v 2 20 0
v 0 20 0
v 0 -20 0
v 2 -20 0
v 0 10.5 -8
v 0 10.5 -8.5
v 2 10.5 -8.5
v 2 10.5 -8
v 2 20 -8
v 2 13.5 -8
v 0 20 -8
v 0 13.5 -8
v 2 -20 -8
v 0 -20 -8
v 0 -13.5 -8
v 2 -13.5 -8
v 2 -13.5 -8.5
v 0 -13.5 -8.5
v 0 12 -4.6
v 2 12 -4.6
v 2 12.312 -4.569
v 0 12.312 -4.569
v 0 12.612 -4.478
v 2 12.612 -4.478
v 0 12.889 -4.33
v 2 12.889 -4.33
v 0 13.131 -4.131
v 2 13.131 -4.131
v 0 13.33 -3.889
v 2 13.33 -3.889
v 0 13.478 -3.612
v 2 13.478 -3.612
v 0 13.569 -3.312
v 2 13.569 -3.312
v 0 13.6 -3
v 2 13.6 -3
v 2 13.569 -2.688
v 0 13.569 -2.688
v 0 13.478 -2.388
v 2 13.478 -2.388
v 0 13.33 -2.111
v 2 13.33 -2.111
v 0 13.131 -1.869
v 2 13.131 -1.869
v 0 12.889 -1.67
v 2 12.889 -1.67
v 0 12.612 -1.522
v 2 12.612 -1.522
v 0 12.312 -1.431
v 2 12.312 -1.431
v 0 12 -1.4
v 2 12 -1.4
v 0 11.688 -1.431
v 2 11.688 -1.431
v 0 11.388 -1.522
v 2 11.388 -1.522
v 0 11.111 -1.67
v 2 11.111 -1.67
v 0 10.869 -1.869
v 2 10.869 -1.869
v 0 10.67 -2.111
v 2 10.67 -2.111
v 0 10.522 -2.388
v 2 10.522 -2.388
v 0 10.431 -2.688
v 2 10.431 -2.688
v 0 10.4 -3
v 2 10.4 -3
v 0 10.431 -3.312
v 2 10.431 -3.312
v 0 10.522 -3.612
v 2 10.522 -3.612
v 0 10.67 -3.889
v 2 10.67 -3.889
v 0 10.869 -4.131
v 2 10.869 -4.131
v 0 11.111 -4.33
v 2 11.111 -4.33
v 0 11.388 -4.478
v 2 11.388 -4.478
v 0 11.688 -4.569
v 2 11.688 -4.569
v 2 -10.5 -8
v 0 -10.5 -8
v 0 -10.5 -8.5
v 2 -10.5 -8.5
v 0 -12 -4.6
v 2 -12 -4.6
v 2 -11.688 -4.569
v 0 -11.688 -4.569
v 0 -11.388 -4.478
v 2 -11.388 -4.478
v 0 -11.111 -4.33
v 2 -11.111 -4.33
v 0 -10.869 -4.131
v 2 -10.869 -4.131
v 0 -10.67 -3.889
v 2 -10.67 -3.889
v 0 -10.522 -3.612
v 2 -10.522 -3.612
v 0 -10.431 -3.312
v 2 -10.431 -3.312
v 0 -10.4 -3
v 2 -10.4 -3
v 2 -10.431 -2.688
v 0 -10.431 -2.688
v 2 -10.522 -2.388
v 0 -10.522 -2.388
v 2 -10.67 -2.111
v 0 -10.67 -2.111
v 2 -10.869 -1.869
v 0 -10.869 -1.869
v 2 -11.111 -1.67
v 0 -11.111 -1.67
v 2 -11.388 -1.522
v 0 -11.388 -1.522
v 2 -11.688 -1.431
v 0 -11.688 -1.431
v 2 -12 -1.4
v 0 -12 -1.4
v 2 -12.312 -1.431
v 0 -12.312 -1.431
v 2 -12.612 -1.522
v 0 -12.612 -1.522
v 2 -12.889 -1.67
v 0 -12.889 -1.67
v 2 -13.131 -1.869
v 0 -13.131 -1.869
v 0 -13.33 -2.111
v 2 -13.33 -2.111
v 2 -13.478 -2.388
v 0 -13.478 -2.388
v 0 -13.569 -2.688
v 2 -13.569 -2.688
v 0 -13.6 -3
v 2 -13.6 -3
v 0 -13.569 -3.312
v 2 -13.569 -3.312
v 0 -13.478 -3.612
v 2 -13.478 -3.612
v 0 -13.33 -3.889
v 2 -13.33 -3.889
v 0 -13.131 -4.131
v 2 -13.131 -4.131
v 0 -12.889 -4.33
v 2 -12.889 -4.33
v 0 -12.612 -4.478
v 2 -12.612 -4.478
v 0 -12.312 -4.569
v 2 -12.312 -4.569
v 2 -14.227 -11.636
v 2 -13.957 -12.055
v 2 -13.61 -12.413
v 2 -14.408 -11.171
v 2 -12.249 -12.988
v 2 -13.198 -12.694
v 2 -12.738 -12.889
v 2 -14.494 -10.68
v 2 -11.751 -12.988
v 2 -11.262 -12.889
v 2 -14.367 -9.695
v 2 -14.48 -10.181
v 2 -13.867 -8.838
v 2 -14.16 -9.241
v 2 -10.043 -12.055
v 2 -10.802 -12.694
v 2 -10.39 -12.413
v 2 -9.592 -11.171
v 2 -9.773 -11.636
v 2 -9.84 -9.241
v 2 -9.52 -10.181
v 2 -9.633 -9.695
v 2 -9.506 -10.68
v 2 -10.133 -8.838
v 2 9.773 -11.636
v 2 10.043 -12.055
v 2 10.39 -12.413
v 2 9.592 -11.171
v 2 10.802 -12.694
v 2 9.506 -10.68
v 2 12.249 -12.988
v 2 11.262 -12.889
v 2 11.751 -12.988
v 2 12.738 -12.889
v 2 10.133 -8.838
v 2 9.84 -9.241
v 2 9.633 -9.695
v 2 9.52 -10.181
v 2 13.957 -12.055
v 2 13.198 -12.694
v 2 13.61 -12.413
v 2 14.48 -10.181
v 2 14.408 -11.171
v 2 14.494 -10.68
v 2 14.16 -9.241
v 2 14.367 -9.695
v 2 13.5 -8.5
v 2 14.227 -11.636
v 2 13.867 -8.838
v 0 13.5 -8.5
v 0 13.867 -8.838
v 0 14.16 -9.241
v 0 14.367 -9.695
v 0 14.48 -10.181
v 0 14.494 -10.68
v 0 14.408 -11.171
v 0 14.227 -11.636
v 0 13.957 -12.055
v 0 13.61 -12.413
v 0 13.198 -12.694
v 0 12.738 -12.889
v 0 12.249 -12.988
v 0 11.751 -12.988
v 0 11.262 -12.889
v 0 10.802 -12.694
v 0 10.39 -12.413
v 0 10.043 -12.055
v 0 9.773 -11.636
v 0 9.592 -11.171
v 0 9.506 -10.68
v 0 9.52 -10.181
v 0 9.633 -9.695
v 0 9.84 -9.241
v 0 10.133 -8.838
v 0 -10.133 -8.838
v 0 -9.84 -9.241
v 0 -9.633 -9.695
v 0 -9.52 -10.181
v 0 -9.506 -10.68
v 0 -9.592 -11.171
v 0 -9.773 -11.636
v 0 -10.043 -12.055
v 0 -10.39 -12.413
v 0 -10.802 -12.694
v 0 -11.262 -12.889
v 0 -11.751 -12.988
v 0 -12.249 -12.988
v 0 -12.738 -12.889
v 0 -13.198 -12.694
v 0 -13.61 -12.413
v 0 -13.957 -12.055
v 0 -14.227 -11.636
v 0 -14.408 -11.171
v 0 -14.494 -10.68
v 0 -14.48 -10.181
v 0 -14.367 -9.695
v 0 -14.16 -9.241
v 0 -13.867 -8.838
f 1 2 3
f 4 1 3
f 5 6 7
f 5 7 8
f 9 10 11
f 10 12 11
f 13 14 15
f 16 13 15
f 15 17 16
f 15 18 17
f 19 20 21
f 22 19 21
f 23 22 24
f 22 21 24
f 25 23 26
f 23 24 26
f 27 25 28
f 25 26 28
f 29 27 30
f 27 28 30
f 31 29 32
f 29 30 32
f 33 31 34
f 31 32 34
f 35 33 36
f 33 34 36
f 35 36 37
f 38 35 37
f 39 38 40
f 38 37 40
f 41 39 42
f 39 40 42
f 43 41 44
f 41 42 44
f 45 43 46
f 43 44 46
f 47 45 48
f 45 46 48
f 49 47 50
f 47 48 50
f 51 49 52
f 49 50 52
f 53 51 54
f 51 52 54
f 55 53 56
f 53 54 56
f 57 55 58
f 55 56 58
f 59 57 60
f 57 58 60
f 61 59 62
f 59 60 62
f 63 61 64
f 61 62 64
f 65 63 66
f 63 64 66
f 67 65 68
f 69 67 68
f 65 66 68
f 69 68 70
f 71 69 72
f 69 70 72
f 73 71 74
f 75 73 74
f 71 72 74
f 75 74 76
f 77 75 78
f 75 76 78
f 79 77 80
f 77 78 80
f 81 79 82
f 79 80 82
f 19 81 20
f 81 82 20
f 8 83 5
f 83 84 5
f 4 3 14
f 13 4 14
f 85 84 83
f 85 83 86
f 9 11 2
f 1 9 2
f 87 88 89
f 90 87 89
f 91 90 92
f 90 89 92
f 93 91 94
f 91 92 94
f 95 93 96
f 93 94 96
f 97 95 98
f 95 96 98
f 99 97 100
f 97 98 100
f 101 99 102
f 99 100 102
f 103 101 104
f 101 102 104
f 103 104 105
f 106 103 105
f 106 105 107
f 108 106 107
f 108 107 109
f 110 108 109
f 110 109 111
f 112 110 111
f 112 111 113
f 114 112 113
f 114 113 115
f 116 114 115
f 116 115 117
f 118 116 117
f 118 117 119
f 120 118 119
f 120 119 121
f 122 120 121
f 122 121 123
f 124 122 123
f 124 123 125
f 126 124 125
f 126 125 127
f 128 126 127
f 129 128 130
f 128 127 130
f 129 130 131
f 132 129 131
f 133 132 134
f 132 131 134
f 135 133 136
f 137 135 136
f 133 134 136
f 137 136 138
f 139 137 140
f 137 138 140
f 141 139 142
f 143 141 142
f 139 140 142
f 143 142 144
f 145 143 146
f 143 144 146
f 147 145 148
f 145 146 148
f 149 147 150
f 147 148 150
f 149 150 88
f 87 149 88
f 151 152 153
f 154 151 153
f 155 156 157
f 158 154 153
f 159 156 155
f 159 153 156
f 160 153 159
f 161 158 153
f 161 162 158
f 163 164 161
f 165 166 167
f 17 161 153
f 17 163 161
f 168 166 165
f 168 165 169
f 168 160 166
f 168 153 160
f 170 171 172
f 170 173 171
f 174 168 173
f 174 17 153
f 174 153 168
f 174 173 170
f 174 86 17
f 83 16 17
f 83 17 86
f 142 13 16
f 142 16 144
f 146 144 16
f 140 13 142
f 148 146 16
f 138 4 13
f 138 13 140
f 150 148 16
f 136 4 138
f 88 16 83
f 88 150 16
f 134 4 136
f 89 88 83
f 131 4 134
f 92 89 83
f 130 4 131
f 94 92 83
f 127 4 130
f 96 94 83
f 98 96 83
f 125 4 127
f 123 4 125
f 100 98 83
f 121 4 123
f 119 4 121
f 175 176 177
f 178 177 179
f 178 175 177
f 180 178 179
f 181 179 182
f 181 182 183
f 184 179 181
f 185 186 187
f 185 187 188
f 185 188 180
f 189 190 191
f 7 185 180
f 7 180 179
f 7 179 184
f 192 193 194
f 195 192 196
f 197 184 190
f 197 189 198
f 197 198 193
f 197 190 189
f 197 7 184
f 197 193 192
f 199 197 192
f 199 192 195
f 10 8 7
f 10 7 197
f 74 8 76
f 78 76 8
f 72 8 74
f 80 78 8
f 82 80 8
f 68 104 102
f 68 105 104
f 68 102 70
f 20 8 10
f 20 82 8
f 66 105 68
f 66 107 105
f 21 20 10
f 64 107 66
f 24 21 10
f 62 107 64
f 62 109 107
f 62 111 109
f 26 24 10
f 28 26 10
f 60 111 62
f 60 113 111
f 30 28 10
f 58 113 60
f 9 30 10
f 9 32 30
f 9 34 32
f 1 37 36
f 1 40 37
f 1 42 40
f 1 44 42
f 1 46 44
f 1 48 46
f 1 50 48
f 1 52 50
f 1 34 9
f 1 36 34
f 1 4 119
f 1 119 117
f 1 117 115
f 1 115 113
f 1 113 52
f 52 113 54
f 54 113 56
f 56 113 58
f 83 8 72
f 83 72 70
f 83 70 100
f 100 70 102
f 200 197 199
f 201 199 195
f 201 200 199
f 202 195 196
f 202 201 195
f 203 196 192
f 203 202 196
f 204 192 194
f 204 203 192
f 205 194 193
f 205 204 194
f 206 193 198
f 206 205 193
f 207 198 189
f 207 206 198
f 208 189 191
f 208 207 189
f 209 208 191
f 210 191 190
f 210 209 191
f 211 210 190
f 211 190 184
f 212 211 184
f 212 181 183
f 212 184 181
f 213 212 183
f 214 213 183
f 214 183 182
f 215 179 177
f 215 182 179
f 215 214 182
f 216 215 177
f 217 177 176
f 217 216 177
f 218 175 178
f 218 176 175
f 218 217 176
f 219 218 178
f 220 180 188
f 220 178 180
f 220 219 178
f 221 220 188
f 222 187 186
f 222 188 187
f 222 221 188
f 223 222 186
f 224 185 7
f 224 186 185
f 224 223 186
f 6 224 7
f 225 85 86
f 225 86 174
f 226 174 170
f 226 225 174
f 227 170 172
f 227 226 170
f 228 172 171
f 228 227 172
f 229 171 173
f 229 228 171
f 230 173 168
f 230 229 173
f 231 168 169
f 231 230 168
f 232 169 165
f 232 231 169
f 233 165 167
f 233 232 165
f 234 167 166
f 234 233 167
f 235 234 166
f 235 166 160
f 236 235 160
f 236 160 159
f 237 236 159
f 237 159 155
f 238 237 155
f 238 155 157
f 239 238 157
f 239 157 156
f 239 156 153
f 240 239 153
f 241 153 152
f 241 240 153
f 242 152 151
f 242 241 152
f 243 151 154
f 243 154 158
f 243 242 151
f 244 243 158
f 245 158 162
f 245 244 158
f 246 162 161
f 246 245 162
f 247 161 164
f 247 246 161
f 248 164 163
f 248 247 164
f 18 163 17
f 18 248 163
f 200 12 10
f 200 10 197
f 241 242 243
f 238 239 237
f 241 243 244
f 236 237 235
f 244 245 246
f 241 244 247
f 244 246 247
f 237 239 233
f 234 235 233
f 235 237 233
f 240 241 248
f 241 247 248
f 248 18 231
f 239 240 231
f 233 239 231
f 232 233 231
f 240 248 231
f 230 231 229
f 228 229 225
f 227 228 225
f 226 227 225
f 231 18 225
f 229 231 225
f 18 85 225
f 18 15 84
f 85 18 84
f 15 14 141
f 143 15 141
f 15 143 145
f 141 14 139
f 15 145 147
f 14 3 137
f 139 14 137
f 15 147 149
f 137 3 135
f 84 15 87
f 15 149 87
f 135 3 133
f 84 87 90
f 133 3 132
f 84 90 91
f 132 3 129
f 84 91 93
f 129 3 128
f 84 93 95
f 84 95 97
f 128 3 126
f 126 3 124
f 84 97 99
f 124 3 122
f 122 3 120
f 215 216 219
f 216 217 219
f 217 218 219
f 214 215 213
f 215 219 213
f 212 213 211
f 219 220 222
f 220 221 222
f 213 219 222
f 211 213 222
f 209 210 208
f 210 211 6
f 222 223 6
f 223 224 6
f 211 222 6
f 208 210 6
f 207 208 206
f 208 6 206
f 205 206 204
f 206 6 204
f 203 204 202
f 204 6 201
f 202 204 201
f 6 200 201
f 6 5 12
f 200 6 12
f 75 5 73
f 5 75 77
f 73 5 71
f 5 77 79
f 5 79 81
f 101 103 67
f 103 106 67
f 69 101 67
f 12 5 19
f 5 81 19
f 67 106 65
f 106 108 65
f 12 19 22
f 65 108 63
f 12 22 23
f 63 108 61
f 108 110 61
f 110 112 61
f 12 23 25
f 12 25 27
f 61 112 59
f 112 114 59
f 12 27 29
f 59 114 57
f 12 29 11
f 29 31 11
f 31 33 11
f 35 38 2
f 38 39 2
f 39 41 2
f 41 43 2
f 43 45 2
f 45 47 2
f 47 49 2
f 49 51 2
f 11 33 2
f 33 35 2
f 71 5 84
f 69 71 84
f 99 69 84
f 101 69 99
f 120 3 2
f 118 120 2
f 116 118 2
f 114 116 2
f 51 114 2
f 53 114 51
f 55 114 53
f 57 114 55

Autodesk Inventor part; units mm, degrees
ref_plane "YZ Plane" through (0, 0, 0) normal (1, 0, 0) x (0, 1, 0)
ref_plane "XZ Plane" through (0, 0, 0) normal (0, 1, 0) x (-1, 0, 0)
ref_plane "XY Plane" through (0, 0, 0) normal (0, 0, 1) x (1, 0, 0)
sketch "スケッチ1" plane through (0, 0, 0) normal (1, 0, 0) x (0, 1, 0)
  line L0 (20, 0) -> (0, 0)
  line L1 (0, 0) -> (0, -8)
  line L2 (0, -8) -> (20, -8)
  line L3 (20, -8) -> (20, 0)
  circle A0 centre (12, -10.5) radius 2.5 construction
  circle A1 centre (12, -10.5) radius 2.5
  line L4 (13.5, -8.5) -> (10.5, -8.5)
  line L5 (10.5, -8.5) -> (10.5, -8)
  line L6 (10.5, -8) -> (13.5, -8)
  line L7 (13.5, -8) -> (13.5, -8.5)
  line L8 (12, -10.5) -> (12, -8)
  point P0 (13.5, -8)
  point P1 (10.5, -8)
  dimension "d1" = 5
  dimension "d0" = 5
  dimension "d2" = 3
  dimension "d3" = 12
  dimension "d4" = 8
  dimension "d5" = 20
extrude "押し出し1" add sketch "スケッチ1" along normal blind 2
mirror "ミラー1" about plane through (0, 0, 0) normal (0, -1, 0)
sketch "スケッチ2" plane through (2, 0, 0) normal (1, 0, 0) x (0, 0, -1)
  line L0 (8.5, 13.5) -> (8, 13.5) projected
  line L1 (8, 13.5) -> (8, 20) projected
  line L2 (8, 20) -> (0, 20) projected
  line L3 (0, 20) -> (0, -20) projected
  line L4 (8, -20) -> (0, -20) projected
  line L5 (8, -13.5) -> (8, -20) projected
  line L6 (8.5, -13.5) -> (8, -13.5) projected
  arc A0 (8.5, -13.5) -> (8.5, -10.5) centre (10.5, -12) ccw projected
  line L7 (8, -10.5) -> (8.5, -10.5) projected
  line L8 (8, 10.5) -> (8, -10.5) projected
  line L9 (8, 10.5) -> (8.5, 10.5) projected
  arc A1 (8.5, 10.5) -> (8.5, 13.5) centre (10.5, 12) ccw projected
  circle A2 centre (3, 12) radius 1.6
  circle A3 centre (3, -12) radius 1.6
  point P0 (0, 0)
  dimension "d8" = 3.2
  dimension "d17" = 3
extrude "押し出し2" cut sketch "スケッチ2" against normal blind 2 contours A2 | A3
properties part number "cover_setter"
